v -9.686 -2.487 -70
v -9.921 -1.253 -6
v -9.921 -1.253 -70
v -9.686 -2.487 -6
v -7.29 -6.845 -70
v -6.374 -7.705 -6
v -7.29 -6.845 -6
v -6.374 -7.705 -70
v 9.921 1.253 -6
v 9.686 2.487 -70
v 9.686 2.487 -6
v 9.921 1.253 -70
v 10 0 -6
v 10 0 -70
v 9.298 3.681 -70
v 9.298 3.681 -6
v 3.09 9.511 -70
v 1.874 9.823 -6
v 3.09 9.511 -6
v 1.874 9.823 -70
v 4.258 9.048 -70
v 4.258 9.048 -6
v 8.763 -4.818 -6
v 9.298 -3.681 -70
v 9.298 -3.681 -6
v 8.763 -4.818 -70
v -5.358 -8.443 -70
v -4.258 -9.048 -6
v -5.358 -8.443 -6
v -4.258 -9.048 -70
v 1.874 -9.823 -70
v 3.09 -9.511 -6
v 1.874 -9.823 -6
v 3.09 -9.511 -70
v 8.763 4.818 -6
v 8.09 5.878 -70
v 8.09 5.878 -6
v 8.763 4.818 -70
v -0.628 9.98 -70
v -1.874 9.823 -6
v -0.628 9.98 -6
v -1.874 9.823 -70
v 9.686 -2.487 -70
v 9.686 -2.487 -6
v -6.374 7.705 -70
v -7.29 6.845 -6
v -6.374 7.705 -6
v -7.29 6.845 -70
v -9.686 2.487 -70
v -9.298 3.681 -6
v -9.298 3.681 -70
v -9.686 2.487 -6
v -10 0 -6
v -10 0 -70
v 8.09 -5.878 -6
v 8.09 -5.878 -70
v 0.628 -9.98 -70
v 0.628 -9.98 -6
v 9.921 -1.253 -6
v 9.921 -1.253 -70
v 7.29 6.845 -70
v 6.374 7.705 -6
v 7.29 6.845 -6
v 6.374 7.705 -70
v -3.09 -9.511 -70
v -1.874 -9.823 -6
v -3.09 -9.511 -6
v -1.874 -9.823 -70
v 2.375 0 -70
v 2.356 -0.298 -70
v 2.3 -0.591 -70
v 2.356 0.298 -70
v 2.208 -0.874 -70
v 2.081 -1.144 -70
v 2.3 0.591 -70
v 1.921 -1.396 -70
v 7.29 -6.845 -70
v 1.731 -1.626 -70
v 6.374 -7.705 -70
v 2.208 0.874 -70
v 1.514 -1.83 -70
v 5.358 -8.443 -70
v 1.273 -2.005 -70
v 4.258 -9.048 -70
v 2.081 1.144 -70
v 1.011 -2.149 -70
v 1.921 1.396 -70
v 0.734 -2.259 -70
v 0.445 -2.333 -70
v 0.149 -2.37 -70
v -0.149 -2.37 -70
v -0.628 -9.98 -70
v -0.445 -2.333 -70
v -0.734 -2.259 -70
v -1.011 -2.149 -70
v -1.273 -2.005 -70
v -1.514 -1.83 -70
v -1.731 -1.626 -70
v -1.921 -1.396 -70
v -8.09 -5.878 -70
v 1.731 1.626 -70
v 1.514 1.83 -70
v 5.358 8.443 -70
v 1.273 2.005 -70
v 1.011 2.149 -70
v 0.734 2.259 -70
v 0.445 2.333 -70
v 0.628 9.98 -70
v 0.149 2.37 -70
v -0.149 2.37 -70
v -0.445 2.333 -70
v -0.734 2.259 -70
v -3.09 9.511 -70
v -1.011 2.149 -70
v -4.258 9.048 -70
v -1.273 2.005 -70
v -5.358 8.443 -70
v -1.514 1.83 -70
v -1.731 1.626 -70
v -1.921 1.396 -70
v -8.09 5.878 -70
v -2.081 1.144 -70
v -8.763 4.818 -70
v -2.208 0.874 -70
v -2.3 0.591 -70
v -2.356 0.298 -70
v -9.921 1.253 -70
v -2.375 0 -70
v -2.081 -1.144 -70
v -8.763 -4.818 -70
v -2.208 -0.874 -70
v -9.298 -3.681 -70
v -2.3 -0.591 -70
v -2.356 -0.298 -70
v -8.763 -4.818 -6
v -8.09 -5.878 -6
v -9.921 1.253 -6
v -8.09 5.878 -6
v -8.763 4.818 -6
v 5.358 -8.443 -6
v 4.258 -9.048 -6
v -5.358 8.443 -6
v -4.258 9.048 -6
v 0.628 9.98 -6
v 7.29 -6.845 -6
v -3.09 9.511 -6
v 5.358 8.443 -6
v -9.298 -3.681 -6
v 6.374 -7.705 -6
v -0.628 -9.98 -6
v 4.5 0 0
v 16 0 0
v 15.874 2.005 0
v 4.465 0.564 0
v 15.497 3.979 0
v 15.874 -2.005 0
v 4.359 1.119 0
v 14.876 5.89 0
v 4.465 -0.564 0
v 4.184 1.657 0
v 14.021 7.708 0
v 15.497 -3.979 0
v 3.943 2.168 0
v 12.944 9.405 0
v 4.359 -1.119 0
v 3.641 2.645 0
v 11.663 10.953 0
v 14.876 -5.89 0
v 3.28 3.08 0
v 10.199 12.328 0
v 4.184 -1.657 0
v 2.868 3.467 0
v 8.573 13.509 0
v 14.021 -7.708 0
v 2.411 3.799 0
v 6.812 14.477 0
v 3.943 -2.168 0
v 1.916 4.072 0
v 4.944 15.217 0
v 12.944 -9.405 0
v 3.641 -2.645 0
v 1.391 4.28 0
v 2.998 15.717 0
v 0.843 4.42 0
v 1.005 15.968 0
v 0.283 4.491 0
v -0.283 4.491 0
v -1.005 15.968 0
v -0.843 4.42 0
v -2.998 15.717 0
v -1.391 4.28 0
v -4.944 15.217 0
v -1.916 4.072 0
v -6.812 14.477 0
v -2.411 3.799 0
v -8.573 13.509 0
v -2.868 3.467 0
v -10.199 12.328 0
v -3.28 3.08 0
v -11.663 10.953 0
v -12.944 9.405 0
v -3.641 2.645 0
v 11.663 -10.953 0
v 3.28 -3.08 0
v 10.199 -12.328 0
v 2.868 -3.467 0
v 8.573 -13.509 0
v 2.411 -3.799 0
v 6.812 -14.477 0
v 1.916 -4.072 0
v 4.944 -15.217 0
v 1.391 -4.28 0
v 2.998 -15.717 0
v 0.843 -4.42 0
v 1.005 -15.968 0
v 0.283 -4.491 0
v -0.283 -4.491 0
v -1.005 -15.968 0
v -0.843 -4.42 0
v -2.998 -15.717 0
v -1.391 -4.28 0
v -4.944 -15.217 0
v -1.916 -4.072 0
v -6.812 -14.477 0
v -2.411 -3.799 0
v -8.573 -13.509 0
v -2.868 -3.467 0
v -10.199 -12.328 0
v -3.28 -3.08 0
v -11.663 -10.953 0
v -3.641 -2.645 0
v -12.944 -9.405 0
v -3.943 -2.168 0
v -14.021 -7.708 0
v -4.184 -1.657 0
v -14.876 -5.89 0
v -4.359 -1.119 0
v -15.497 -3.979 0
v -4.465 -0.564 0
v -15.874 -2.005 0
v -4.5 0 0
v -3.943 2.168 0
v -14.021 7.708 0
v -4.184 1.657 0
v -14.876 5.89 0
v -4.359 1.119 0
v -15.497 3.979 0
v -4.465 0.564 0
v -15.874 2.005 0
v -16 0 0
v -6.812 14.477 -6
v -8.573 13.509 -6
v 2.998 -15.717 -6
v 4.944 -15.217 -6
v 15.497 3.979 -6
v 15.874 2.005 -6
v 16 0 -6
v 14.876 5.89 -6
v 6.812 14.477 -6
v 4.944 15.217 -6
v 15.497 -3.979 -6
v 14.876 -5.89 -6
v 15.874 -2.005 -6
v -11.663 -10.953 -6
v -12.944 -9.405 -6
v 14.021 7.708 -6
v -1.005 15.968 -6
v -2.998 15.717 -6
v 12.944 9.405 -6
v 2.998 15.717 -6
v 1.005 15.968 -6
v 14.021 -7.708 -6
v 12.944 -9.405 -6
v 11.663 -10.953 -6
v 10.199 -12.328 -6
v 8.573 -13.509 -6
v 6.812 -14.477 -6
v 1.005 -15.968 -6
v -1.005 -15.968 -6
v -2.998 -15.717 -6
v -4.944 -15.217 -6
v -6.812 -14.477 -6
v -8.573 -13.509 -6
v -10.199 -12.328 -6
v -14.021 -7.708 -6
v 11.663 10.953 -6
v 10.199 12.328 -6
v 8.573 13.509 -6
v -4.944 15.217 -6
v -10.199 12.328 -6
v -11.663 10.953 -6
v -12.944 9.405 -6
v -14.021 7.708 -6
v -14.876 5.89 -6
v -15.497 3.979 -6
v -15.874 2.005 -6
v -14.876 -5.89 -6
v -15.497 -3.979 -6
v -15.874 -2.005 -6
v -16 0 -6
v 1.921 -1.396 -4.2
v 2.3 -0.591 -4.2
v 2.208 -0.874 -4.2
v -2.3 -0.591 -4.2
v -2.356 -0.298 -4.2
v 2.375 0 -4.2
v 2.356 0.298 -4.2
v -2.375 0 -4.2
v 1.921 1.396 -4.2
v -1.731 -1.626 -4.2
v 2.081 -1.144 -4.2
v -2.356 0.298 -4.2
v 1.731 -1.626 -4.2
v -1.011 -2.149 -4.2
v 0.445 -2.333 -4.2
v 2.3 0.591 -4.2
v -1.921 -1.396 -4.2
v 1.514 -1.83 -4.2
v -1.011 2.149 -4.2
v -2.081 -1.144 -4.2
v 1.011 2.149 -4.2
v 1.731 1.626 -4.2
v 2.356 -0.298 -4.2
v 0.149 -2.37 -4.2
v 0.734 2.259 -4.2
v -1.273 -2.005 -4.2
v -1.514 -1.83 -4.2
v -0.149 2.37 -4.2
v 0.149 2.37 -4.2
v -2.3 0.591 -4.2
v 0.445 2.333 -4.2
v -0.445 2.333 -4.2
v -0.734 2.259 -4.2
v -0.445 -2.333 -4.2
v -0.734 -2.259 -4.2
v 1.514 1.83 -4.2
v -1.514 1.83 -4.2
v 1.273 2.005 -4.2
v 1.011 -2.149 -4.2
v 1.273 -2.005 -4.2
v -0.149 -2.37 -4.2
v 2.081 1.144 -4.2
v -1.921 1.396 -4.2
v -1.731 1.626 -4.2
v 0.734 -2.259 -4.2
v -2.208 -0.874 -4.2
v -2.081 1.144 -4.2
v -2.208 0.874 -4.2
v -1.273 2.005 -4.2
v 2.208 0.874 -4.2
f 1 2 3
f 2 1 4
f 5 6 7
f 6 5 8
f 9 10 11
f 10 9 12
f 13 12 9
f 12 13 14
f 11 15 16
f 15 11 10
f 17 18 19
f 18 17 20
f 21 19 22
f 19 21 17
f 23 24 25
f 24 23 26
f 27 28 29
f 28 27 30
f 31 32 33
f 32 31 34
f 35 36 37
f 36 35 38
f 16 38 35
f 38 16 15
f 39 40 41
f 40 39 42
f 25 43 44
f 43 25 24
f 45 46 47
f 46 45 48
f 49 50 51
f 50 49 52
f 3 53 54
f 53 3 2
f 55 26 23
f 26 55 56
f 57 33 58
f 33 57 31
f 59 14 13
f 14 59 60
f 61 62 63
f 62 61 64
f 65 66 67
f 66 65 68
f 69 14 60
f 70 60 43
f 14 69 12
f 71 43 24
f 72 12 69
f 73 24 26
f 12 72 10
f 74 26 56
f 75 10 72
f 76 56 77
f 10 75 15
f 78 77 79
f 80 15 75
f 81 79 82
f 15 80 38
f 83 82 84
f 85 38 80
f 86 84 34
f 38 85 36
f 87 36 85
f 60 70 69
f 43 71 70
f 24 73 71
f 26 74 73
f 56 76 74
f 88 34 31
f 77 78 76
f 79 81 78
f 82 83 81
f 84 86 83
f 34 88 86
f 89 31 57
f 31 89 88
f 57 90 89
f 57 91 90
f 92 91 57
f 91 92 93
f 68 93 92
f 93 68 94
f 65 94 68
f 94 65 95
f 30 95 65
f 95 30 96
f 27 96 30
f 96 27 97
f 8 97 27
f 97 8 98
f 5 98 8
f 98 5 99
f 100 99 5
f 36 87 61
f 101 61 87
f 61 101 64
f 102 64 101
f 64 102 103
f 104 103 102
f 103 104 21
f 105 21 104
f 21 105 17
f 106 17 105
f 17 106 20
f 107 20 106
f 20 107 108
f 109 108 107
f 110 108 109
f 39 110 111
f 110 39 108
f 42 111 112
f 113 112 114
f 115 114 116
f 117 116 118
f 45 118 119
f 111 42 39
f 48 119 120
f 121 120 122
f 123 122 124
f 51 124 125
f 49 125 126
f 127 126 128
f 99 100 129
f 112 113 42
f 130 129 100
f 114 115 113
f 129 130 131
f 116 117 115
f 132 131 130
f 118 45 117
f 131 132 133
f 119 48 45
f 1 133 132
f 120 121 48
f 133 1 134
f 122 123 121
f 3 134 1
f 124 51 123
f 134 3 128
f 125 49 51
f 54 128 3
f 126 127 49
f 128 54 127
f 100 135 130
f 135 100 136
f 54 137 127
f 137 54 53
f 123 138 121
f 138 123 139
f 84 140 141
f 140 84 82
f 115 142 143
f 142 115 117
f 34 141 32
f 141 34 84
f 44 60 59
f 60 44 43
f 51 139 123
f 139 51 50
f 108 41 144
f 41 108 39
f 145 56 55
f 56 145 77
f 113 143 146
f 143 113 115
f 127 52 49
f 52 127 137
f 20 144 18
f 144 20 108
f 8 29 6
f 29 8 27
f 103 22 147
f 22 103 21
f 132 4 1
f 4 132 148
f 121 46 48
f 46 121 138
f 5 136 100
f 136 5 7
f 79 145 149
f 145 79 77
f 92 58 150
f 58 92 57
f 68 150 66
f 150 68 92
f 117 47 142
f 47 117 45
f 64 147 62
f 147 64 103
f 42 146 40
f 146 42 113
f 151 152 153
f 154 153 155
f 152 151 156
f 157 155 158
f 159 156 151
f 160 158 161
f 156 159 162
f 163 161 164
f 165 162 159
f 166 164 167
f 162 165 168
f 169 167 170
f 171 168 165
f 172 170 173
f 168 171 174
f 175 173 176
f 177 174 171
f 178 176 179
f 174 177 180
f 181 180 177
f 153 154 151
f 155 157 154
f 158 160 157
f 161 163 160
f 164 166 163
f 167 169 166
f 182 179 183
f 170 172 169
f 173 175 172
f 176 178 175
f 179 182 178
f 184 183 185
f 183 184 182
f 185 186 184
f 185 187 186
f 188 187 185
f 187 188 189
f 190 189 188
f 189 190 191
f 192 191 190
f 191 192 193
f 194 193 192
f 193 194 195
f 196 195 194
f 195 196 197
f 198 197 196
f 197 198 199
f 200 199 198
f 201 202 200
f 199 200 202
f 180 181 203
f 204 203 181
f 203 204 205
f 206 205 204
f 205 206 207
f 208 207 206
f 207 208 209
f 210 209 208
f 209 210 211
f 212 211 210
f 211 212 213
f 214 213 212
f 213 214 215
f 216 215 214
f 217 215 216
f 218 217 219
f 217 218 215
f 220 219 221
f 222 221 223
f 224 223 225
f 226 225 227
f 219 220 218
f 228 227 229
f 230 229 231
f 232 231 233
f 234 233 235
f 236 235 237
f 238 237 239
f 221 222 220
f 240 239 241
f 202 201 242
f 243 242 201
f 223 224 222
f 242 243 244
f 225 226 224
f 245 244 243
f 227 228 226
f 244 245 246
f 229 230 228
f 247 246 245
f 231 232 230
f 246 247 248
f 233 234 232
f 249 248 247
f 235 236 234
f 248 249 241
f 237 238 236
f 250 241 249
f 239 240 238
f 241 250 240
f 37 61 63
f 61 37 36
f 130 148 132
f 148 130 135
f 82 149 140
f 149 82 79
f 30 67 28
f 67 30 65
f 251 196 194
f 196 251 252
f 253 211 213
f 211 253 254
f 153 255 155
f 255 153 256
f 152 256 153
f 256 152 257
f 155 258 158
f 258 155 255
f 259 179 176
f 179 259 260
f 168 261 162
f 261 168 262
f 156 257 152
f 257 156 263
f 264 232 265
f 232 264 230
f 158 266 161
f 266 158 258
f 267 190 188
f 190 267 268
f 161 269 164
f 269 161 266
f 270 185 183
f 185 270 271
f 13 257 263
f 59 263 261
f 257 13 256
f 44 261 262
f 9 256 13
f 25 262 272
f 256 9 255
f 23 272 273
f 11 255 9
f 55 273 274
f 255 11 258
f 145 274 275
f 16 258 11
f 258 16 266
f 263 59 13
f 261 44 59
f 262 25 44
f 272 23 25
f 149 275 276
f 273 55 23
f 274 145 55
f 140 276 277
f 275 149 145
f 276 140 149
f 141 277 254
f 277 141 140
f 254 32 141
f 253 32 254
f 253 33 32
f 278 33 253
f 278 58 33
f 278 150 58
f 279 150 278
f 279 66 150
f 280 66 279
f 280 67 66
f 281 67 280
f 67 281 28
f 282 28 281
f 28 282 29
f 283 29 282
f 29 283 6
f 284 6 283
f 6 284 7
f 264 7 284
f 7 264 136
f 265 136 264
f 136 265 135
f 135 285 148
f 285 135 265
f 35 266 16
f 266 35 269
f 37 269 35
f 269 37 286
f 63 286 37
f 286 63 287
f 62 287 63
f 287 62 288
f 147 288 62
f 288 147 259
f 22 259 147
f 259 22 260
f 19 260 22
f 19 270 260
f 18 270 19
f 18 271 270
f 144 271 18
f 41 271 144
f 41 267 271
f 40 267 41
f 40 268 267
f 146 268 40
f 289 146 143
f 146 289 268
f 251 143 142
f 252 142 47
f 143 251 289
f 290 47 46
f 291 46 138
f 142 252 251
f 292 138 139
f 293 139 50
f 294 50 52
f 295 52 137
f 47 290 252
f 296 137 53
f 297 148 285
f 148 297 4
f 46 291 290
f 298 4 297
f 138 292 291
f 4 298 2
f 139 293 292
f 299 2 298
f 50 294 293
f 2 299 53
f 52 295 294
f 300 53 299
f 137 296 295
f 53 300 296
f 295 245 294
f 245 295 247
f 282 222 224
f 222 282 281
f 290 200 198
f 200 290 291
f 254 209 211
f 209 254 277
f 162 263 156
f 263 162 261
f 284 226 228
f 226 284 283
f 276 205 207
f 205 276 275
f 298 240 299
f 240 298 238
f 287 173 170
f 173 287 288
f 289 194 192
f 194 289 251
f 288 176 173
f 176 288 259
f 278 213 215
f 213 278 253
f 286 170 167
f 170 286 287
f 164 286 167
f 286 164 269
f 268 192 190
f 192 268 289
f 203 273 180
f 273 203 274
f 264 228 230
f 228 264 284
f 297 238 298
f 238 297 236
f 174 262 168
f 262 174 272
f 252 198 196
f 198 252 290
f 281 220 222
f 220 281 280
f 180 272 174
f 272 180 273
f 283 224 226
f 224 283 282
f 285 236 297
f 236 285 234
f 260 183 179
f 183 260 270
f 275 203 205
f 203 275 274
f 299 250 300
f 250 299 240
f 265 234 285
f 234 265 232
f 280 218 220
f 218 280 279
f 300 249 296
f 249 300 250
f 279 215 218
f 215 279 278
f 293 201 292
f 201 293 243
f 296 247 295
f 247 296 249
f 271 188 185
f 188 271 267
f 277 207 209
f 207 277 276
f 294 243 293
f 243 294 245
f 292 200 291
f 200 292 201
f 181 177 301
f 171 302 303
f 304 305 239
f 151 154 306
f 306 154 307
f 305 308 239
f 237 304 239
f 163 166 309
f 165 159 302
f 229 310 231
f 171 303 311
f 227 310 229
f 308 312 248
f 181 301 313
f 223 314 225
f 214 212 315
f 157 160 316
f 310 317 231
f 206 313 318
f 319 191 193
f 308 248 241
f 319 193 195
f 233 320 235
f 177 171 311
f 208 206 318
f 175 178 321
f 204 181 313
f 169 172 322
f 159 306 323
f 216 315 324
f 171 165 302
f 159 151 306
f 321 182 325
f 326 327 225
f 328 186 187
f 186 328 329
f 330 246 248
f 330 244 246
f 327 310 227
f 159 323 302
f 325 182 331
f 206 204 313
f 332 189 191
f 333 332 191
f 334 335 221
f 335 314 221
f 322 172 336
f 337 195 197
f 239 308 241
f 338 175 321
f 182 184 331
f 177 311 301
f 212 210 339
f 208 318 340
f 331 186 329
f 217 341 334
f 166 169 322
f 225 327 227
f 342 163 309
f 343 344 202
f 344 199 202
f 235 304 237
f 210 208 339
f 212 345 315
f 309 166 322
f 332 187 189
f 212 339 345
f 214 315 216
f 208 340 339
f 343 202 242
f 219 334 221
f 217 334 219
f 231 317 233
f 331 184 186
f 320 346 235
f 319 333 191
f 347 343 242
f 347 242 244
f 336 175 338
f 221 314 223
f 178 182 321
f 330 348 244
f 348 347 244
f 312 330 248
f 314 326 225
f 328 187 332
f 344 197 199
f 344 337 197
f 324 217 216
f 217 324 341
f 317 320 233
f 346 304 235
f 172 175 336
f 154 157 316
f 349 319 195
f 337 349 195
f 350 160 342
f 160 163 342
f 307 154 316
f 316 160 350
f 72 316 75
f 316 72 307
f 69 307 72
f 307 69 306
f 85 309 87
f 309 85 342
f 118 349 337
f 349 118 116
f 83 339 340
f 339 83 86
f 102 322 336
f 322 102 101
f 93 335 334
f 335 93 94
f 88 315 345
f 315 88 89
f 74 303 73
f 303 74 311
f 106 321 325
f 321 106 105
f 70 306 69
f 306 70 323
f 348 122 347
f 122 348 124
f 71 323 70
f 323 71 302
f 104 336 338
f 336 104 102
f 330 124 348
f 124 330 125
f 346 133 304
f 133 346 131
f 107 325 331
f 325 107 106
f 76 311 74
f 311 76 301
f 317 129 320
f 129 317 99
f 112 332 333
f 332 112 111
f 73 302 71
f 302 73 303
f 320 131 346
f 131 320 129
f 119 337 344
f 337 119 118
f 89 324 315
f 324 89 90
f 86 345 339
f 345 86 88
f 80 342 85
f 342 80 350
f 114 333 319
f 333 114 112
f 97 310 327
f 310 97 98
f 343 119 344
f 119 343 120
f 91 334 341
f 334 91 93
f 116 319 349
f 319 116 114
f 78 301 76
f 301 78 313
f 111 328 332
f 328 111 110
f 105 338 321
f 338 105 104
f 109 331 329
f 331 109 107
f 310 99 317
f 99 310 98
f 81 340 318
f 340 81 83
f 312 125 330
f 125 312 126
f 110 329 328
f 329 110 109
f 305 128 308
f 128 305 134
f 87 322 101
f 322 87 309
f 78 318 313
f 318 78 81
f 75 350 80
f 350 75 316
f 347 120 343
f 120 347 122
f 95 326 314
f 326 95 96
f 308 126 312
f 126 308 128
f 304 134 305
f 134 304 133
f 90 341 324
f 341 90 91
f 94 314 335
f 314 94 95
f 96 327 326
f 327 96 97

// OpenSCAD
$fn = 50;


difference() {
	union() {
		translate(v = [0, 0, -70.0000000000]) {
			cylinder(h = 70, r = 10.0000000000);
		}
		translate(v = [0, 0, -6.0000000000]) {
			cylinder(h = 6, r = 16.0000000000);
		}
	}
	union() {
		translate(v = [0, 0, 0]) {
			rotate(a = [0, 0, 0]) {
				difference() {
					union() {
						#translate(v = [0, 0, -70.0000000000]) {
							cylinder(h = 70, r = 2.2500000000);
						}
						#translate(v = [0, 0, -4.2000000000]) {
							cylinder(h = 4.2000000000, r1 = 2.3750000000, r2 = 4.5000000000);
						}
						#translate(v = [0, 0, -70.0000000000]) {
							cylinder(h = 70, r = 2.3750000000);
						}
						#translate(v = [0, 0, -70.0000000000]) {
							cylinder(h = 70, r = 2.2500000000);
						}
					}
					union();
				}
			}
		}
	}
}
